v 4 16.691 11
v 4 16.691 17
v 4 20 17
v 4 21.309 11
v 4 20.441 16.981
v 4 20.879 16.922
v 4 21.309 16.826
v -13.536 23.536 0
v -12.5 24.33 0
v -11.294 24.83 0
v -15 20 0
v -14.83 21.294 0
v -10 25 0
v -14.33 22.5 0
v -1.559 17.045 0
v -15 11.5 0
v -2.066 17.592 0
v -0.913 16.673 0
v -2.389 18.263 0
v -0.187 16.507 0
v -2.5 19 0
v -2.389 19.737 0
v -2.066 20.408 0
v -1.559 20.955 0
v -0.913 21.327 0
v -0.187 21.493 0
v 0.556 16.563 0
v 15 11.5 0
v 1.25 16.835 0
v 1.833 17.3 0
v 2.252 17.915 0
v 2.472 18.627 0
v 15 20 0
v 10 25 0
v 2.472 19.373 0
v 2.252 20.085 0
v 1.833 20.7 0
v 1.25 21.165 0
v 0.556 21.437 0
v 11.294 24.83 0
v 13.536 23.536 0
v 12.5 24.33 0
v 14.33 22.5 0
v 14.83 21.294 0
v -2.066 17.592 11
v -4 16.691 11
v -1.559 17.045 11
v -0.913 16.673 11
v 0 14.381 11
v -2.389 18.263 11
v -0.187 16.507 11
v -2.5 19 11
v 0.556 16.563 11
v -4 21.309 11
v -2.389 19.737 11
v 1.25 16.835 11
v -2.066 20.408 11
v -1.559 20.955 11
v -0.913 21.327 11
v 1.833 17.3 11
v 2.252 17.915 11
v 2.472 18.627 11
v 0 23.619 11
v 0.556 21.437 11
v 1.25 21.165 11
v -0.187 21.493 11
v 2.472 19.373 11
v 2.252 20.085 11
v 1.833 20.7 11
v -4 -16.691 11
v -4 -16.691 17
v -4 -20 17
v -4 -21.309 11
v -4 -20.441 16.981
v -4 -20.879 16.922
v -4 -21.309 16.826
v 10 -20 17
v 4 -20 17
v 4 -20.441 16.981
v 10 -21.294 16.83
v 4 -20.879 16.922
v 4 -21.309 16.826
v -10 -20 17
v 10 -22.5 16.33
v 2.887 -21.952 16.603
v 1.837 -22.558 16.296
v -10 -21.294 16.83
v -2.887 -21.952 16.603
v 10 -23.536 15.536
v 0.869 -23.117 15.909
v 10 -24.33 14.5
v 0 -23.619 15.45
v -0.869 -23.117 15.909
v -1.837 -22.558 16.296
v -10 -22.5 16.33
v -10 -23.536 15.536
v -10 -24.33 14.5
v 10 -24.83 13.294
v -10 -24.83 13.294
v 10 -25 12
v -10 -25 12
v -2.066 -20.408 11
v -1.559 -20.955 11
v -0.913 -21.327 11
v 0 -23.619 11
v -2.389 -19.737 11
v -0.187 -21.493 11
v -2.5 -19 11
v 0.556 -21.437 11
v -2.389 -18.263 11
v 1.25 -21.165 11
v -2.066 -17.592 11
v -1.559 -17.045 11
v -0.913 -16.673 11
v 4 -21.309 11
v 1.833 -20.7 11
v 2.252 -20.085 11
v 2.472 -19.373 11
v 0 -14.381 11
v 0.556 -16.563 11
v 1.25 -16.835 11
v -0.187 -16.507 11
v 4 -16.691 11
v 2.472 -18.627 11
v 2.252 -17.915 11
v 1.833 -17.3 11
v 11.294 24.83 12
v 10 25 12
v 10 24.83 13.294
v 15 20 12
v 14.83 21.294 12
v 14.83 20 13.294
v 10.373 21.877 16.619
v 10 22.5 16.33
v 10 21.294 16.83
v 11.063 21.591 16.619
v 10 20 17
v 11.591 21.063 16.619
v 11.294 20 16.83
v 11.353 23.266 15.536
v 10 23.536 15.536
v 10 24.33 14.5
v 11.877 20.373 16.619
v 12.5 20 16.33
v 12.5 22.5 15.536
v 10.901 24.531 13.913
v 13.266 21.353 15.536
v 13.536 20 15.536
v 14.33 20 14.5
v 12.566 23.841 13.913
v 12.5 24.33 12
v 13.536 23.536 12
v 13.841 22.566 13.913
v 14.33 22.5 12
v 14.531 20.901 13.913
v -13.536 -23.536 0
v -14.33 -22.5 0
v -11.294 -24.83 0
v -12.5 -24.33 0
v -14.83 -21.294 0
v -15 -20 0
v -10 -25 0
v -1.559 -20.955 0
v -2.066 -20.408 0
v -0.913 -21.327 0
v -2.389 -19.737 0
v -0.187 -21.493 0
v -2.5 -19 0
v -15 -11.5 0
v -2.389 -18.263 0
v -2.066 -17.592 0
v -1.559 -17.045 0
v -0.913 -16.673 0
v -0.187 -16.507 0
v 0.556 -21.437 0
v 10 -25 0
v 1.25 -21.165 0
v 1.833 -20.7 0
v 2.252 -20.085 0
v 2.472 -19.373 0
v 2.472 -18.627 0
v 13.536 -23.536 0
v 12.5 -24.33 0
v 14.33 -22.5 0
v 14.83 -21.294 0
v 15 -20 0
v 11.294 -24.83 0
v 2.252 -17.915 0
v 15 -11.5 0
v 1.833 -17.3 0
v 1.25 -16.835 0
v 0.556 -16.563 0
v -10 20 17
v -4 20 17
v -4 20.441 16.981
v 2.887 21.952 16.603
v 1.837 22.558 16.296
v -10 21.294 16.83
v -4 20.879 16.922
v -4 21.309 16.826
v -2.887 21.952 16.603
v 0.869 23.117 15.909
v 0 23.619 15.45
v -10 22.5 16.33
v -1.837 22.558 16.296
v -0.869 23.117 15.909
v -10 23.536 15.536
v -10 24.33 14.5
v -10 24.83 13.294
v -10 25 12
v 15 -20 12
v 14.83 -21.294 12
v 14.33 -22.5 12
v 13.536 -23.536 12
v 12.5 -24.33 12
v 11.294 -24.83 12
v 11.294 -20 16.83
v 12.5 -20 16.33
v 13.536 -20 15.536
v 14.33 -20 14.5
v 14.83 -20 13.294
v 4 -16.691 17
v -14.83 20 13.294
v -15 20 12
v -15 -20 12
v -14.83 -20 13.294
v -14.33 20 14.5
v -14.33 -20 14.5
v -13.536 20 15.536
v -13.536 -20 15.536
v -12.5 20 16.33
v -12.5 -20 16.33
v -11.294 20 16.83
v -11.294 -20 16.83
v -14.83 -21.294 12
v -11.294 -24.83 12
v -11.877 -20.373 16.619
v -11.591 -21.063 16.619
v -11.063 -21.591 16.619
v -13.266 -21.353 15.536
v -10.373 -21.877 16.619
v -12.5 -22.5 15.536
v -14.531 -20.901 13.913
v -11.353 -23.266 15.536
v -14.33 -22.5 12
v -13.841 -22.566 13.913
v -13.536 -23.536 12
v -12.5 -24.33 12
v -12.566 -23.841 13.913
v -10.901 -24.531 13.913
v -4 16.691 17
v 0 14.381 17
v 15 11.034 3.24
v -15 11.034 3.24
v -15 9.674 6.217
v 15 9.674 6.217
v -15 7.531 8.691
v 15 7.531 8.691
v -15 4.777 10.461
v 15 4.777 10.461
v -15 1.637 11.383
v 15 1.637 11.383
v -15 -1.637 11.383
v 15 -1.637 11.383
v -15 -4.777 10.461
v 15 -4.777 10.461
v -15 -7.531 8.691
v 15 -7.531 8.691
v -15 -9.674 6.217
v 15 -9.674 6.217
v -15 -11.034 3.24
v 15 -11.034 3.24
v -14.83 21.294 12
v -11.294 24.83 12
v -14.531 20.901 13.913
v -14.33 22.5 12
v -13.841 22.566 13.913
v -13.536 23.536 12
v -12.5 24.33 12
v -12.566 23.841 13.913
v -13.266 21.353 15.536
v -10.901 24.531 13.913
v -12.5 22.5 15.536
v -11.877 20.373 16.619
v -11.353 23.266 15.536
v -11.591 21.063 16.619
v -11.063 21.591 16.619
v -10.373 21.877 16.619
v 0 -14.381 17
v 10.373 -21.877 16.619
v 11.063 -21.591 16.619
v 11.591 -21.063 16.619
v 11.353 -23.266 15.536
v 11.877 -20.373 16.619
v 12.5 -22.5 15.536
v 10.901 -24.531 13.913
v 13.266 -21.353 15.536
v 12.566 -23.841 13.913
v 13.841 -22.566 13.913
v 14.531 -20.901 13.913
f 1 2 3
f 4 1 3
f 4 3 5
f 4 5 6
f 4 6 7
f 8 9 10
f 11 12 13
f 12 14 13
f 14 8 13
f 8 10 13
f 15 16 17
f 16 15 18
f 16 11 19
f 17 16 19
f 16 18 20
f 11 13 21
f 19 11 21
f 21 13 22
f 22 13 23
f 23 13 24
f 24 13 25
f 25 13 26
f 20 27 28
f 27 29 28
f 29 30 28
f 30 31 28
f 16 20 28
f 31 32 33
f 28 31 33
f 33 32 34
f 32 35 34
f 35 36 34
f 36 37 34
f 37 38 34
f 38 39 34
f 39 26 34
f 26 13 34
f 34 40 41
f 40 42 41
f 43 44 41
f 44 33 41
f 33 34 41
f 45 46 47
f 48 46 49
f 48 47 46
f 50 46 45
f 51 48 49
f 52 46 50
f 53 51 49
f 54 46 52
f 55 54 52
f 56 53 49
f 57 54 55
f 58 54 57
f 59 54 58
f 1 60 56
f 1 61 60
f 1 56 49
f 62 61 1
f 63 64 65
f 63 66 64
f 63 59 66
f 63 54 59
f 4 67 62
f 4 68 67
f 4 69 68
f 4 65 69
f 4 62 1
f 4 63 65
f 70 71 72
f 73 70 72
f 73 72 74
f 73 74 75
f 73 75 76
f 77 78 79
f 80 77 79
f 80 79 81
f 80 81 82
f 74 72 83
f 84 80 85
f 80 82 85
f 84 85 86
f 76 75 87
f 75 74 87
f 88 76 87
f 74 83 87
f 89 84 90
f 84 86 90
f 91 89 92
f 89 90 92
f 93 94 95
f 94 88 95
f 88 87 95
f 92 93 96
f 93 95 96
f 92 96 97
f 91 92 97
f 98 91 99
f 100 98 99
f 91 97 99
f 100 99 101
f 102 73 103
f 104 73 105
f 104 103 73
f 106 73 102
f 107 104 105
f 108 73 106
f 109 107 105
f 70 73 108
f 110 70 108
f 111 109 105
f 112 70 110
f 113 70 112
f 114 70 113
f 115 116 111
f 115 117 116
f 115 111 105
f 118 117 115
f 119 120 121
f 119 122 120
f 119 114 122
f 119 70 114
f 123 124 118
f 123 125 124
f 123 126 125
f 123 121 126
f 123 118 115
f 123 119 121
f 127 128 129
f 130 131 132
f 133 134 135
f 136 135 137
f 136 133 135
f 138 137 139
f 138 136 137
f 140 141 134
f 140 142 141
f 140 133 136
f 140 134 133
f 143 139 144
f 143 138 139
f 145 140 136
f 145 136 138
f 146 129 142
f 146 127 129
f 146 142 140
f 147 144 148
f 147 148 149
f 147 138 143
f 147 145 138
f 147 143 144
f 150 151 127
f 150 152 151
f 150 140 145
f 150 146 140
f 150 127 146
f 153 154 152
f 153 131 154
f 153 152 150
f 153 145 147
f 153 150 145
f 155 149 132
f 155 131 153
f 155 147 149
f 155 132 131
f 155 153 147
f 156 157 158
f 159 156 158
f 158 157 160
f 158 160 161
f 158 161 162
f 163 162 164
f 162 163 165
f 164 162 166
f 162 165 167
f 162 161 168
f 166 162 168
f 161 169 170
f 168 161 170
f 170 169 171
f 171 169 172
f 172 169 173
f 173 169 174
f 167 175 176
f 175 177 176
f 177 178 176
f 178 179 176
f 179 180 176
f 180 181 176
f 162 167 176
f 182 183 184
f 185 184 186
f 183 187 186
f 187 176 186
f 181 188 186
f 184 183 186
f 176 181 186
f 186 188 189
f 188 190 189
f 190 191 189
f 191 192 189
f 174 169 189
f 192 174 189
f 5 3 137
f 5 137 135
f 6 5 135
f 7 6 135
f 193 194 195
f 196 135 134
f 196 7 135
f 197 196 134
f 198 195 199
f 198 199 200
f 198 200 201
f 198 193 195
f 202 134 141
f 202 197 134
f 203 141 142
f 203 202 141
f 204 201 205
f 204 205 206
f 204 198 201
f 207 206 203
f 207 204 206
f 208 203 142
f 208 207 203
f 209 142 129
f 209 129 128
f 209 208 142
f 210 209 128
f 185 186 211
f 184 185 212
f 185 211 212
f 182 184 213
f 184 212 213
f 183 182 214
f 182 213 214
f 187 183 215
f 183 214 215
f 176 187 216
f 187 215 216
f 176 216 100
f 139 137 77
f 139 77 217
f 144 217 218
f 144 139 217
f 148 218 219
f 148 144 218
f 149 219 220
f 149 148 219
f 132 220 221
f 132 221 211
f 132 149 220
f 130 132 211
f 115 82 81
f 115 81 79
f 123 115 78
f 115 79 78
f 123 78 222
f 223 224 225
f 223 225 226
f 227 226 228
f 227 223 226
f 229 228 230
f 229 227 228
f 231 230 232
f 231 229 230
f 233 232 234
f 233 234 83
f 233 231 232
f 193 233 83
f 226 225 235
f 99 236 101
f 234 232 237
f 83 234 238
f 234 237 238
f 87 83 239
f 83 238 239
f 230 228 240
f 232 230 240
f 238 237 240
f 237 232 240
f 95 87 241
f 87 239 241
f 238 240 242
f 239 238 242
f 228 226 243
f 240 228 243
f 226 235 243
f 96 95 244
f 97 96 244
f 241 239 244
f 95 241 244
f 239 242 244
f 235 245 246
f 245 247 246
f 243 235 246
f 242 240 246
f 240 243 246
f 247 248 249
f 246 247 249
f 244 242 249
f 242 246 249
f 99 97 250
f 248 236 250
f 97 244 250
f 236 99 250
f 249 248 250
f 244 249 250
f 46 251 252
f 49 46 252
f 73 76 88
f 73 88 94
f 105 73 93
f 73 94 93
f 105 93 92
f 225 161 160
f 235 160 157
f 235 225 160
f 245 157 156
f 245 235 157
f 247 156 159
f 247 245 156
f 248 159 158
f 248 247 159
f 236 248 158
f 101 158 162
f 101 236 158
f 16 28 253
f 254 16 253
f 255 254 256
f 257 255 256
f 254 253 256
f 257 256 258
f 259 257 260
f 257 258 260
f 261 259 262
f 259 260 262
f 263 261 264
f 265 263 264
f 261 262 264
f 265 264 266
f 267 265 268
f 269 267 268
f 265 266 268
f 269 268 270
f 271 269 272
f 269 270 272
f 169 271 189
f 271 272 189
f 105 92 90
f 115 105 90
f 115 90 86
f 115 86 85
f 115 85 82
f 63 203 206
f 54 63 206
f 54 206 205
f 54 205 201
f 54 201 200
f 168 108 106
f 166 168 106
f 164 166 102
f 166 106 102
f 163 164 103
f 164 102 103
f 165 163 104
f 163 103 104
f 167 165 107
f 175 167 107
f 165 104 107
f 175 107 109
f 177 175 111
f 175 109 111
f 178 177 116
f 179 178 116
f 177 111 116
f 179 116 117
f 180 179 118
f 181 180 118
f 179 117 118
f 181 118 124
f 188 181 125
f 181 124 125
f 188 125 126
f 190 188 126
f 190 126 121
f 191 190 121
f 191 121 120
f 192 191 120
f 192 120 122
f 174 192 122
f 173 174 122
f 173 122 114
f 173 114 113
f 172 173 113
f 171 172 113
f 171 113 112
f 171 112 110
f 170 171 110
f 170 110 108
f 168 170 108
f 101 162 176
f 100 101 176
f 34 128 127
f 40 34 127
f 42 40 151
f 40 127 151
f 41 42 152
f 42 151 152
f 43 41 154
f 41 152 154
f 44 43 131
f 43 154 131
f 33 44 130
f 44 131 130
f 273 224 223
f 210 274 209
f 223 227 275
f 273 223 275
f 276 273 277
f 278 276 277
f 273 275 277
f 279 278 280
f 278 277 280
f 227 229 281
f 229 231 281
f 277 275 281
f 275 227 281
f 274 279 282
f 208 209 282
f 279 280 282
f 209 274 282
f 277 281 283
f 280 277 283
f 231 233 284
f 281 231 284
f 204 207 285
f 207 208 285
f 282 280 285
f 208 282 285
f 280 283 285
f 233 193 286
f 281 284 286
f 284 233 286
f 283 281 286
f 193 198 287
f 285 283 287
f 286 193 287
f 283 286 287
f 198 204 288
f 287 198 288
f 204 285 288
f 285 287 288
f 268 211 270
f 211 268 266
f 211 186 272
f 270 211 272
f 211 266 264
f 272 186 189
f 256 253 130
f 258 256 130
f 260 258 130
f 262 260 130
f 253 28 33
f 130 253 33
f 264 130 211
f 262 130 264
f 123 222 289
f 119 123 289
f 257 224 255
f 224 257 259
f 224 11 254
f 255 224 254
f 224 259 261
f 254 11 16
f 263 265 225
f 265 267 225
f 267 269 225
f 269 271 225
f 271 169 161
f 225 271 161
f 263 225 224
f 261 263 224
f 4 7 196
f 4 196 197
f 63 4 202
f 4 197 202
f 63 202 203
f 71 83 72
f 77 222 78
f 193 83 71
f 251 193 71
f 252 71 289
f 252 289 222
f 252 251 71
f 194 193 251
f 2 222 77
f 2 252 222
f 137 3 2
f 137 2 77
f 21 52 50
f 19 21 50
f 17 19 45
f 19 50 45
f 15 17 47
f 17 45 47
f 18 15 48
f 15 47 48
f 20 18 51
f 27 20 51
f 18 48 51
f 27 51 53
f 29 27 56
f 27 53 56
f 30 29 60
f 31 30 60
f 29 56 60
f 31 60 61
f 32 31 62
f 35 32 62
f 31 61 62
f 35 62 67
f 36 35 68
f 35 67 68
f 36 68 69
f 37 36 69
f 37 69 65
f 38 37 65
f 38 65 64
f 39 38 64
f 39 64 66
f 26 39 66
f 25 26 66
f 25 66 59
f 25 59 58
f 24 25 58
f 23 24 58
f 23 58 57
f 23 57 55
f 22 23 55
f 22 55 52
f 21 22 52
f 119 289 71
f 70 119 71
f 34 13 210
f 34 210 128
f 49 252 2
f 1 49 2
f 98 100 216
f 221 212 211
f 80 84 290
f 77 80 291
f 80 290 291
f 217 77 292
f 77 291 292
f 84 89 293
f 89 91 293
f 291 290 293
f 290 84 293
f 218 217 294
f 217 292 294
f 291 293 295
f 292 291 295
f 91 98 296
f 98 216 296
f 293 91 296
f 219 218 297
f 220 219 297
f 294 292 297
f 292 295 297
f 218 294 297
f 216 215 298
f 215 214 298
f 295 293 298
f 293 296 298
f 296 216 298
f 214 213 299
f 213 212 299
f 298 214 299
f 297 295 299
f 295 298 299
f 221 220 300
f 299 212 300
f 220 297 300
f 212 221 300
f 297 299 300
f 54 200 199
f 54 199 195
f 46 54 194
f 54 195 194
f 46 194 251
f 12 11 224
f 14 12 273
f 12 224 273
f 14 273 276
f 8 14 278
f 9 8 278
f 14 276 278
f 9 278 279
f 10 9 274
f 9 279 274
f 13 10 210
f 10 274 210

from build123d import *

# Parameters (mm, degrees)
F0_W         = 30
F0_H         = 25
F1_DEPTH     = 17
F3_DEPTH     = 50
F4_D         = 5
F5_R         = 2.5
F6_DEPTH     = 6
F7_R         = 5
F8_T1_DEPTH  = 40
F8_T3_DEPTH  = 20
F8_T6_ANGLE  = 90
F8_T8_ANGLE  = 90
F8_T10_ANGLE = 90
F8_T12_ANGLE = 90


# Not quite as in the source:
# - a fillet or chamfer that OpenCascade refuses, or shapes differently, is made with other operations: its cross-section is extruded or revolved along the edge and cut away or added


with BuildPart() as f1:
    # F0 (on Top) → F1 (new body)
    with BuildSketch(Plane.XY):
        with Locations((0, 12.5)):
            Rectangle(F0_W, F0_H)
        with Locations((0, -12.5)):
            Rectangle(F0_W, F0_H)
    extrude(amount=F1_DEPTH)

    # F2 (on face) → F3 (cut)
    with BuildSketch(Plane.YZ.offset(15)):
        with BuildLine():
            Line((-11.5, 0), (11.5, 0))
            ThreePointArc((11.5, 0), (0, 11.5), (-11.5, 0))
        make_face()
        with BuildLine():
            ThreePointArc((-11.5, 0), (0, -11.5), (11.5, 0))
            Line((11.5, 0), (-11.5, 0))
        make_face()
    extrude(amount=-F3_DEPTH, mode=Mode.SUBTRACT)

    # F4 (through all)
    with Locations(Plane(origin=(0, 0, 0), x_dir=(1, 0, 0), z_dir=(0, 0, -1))):
        with Locations((0, -19), (0, 19)):
            Hole(F4_D / 2)

    # F5 (on face) → F6 (cut)
    with BuildSketch(Plane.XY.offset(17)):
        Polygon((4, -21.3094010768), (4, -16.6905989232), (0, -14.3811978465), (-4, -16.6905989232), (-4, -21.3094010768), (0, -23.6188021535), align=None)
        with Locations((0, -19)):
            Circle(F5_R, mode=Mode.SUBTRACT)
        Polygon((4, 16.6905989232), (4, 21.3094010768), (0, 23.6188021535), (-4, 21.3094010768), (-4, 16.6905989232), (0, 14.3811978465), align=None)
        with Locations((0, 19)):
            Circle(F5_R, mode=Mode.SUBTRACT)
    extrude(amount=-F6_DEPTH, mode=Mode.SUBTRACT)

    # F7
    f7_edges = [f1.edges().sort_by_distance(p)[0] for p in [
        (-15, 25, 8.5),
        (15, 25, 8.5),
        (-15, -25, 8.5),
        (15, -25, 8.5),
    ]]
    fillet(f7_edges, radius=F7_R)

    # F8: fillet of radius 5 on 1 edges, made by hand

    # F8_s2 → F8_t1 (cut)
    with BuildSketch(Plane.XZ.offset(-20)):
        with BuildLine():
            ThreePointArc((-15, 12), (-13.5355339059, 15.5355339059), (-10, 17))
            Line((-10, 17), (-15, 17))
            Line((-15, 17), (-15, 12))
        make_face()
        with BuildLine():
            ThreePointArc((10, 17), (13.5355339059, 15.5355339059), (15, 12))
            Line((15, 12), (15, 17))
            Line((15, 17), (10, 17))
        make_face()
    extrude(amount=F8_T1_DEPTH, mode=Mode.SUBTRACT)

    # F8_s4 → F8_t3 (cut)
    with BuildSketch(Plane.YZ.offset(-10)):
        with BuildLine():
            ThreePointArc((-20, 17), (-23.5355339059, 15.5355339059), (-25, 12))
            Line((-25, 12), (-25, 17))
            Line((-25, 17), (-20, 17))
        make_face()
        with BuildLine():
            ThreePointArc((20, 17), (23.5355339059, 15.5355339059), (25, 12))
            Line((25, 12), (25, 17))
            Line((25, 17), (20, 17))
        make_face()
    extrude(amount=F8_T3_DEPTH, mode=Mode.SUBTRACT)

    # F8_s5 → F8_t6 (revolve, cut)
    with BuildSketch(Plane.XZ.offset(-20)):
        with BuildLine():
            ThreePointArc((-15, 12), (-13.5355339059, 15.5355339059), (-10, 17))
            Line((-10, 17), (-15, 17))
            Line((-15, 17), (-15, 12))
        make_face()
    revolve(axis=Axis((-10, 20, 17), (0, 0, -1)), revolution_arc=F8_T6_ANGLE, mode=Mode.SUBTRACT)

    # F8_s7 → F8_t8 (revolve, cut)
    with BuildSketch(Plane.XZ.offset(20)):
        with BuildLine():
            ThreePointArc((-10, 17), (-13.5355339059, 15.5355339059), (-15, 12))
            Line((-15, 12), (-15, 17))
            Line((-15, 17), (-10, 17))
        make_face()
    revolve(axis=Axis((-10, -20, 17), (0, 0, 1)), revolution_arc=F8_T8_ANGLE, mode=Mode.SUBTRACT)

    # F8_s9 → F8_t10 (revolve, cut)
    with BuildSketch(Plane.YZ.offset(10)):
        with BuildLine():
            ThreePointArc((-20, 17), (-23.5355339059, 15.5355339059), (-25, 12))
            Line((-25, 12), (-25, 17))
            Line((-25, 17), (-20, 17))
        make_face()
    revolve(axis=Axis((10, -20, 17), (0, 0, 1)), revolution_arc=F8_T10_ANGLE, mode=Mode.SUBTRACT)

    # F8_s11 → F8_t12 (revolve, cut)
    with BuildSketch(Plane.YZ.offset(10)):
        with BuildLine():
            ThreePointArc((20, 17), (23.5355339059, 15.5355339059), (25, 12))
            Line((25, 12), (25, 17))
            Line((25, 17), (20, 17))
        make_face()
    revolve(axis=Axis((10, 20, 17), (0, 0, -1)), revolution_arc=F8_T12_ANGLE, mode=Mode.SUBTRACT)


solid = f1.part
